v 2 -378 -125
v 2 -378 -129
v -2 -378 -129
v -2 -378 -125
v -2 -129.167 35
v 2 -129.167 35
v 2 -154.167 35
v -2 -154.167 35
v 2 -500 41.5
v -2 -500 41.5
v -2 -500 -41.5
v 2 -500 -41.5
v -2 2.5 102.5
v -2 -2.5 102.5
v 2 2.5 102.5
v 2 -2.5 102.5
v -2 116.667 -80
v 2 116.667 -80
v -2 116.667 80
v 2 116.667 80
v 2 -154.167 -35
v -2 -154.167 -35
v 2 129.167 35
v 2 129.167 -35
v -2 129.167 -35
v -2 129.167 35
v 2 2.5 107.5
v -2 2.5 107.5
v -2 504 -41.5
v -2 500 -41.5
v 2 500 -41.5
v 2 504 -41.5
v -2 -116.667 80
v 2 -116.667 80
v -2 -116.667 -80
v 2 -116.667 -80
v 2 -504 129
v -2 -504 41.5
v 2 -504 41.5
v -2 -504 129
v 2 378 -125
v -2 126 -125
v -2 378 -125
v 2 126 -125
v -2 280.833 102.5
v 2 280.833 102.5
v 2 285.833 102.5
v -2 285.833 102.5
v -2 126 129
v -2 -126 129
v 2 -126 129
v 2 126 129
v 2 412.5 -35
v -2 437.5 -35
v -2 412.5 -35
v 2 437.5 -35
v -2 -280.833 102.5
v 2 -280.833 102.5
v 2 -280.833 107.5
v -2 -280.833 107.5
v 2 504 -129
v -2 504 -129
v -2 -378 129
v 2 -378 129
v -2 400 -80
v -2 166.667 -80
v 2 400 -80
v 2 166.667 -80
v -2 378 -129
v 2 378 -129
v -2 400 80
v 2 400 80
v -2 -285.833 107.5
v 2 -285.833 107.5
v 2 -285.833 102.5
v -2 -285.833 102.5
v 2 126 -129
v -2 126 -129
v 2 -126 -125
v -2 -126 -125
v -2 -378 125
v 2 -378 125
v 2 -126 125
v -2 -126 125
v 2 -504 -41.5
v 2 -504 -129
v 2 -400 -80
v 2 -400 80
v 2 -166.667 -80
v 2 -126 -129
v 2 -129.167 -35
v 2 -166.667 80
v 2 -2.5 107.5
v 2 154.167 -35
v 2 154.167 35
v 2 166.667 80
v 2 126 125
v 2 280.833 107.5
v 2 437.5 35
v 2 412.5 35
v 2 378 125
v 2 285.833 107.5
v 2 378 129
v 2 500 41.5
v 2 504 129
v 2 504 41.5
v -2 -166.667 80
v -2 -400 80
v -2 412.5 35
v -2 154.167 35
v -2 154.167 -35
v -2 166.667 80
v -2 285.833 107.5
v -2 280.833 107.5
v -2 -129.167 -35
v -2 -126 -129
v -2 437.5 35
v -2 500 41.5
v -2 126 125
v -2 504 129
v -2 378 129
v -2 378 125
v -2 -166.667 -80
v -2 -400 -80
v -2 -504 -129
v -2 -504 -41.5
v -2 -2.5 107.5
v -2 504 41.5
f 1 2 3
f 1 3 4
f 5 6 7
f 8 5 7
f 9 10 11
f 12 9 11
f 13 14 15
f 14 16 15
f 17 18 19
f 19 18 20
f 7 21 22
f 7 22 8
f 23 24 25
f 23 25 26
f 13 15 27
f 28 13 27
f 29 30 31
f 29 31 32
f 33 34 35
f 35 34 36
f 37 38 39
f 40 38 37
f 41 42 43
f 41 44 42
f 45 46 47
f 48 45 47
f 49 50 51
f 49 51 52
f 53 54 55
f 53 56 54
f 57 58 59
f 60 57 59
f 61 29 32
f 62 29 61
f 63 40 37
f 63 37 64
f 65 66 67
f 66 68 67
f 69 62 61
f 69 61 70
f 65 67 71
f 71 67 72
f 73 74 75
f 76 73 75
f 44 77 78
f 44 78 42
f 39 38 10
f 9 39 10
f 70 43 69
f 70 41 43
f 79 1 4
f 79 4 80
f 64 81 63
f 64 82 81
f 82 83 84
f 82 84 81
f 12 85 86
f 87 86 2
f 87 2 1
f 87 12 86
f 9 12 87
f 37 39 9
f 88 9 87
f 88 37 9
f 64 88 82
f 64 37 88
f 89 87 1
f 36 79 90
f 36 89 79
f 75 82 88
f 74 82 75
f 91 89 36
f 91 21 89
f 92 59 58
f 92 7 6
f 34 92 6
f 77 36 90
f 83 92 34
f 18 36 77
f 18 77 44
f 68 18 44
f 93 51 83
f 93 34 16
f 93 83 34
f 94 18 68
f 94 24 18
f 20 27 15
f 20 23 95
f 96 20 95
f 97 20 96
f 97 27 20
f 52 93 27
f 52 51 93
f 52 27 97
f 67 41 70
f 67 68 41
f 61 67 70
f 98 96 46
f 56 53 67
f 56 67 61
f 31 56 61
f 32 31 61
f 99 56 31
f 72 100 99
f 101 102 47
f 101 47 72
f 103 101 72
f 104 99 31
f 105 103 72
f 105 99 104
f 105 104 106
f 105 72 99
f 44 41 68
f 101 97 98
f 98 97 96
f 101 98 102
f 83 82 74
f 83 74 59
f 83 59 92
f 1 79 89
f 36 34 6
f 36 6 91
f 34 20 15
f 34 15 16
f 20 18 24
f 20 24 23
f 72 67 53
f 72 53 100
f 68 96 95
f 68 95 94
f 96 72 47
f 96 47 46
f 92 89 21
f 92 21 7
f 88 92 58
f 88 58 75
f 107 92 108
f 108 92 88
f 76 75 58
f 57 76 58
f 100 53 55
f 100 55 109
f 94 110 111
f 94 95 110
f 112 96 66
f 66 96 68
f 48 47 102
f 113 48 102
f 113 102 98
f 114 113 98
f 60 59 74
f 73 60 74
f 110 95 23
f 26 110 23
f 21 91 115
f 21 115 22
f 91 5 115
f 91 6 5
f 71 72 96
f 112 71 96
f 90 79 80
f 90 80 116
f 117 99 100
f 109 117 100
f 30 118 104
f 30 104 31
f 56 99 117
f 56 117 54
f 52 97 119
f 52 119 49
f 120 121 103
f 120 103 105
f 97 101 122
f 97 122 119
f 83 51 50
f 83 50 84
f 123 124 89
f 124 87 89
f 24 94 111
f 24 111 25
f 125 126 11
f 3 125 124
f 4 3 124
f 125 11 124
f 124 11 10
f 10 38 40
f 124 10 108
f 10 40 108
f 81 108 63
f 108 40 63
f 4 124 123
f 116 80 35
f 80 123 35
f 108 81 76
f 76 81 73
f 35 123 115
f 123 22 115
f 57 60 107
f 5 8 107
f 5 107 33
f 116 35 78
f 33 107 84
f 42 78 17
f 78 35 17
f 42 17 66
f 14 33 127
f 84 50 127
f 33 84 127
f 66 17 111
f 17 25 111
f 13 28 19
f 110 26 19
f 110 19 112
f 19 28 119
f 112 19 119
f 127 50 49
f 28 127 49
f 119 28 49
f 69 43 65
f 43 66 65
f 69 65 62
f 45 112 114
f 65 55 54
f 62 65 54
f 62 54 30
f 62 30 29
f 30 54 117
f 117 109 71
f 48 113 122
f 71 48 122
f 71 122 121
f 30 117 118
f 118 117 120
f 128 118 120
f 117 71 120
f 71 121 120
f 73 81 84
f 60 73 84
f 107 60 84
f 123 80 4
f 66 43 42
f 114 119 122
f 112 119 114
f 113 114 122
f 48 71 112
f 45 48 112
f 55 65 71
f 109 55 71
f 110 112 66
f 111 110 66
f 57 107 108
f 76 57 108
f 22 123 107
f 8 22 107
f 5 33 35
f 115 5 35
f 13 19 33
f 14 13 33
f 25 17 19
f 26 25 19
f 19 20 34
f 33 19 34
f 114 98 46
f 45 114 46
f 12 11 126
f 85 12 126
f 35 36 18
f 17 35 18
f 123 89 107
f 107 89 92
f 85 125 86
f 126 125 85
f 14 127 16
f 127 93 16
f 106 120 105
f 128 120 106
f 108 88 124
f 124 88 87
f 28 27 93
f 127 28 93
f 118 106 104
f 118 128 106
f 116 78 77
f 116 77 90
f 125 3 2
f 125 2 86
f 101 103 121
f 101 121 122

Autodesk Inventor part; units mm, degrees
ref_plane "YZ Plane" through (0, 0, 0) normal (1, 0, 0) x (0, 1, 0)
ref_plane "XZ Plane" through (0, 0, 0) normal (0, 1, 0) x (-1, 0, 0)
ref_plane "XY Plane" through (0, 0, 0) normal (0, 0, 1) x (1, 0, 0)
sketch "Esboço1" plane through (0, 0, 0) normal (1, 0, 0) x (0, 1, 0)
  line L0 (-504, 129) -> (504, 129)
  line L1 (504, 129) -> (504, -129)
  line L2 (504, -129) -> (-504, -129)
  line L3 (-504, -129) -> (-504, 129)
  line L4 (-504, 129) -> (504, -129) construction
  line L5 (504, 129) -> (-504, -129) construction
  point P0 (0, 0)
  dimension "d0" = 1008
  dimension "d1" = 258
extrude "Extrusão1" add sketch "Esboço1" along normal mid plane 4
sketch "Esboço2" plane through (2, 0, 0) normal (1, 0, 0) x (0, 0, -1)
  line L0 (-133, 378) -> (-125, 378)
  line L1 (-125, 378) -> (-125, 126)
  line L2 (-125, 126) -> (-133, 126)
  line L3 (-133, 126) -> (-133, 378)
  line L4 (-129, 504) -> (-129, -504) projected
  line L5 (-133, 378) -> (-125, 126) construction
  line L6 (-125, 378) -> (-133, 126) construction
  line L7 (129, 504) -> (-129, 504) projected
  line L8 (-133, -126) -> (-125, -126)
  line L9 (-125, -126) -> (-125, -378)
  line L10 (-125, -378) -> (-133, -378)
  line L11 (-133, -378) -> (-133, -126)
  line L12 (-133, -126) -> (-125, -378) construction
  line L13 (-125, -126) -> (-133, -378) construction
  line L14 (-129, -504) -> (129, -504) projected
  line L15 (125, 378) -> (133, 378)
  line L16 (133, 378) -> (133, 126)
  line L17 (133, 126) -> (125, 126)
  line L18 (125, 126) -> (125, 378)
  line L19 (129, -504) -> (129, 504) projected
  line L20 (125, 378) -> (133, 126) construction
  line L21 (133, 378) -> (125, 126) construction
  line L22 (125, -126) -> (133, -126)
  line L23 (133, -126) -> (133, -378)
  line L24 (133, -378) -> (125, -378)
  line L25 (125, -378) -> (125, -126)
  line L26 (125, -126) -> (133, -378) construction
  line L27 (133, -126) -> (125, -378) construction
  point P0 (0, 0)
  point P1 (-129, 252)
  point P2 (-129, -252)
  point P3 (129, 252)
  point P4 (129, -252)
  dimension "d4" = 8
  dimension "d5" = 252
  dimension "d6" = 126
  dimension "d7" = 8
  dimension "d8" = 252
  dimension "d9" = 252
  dimension "d10" = 126
  dimension "d11" = 126
  dimension "d12" = 252
  dimension "d13" = 8
  dimension "d14" = 252
  dimension "d15" = 8
  dimension "d16" = 252
  dimension "d17" = 126
extrude "Extrusão2" cut sketch "Esboço2" along normal through all both and the other way through all contours L0 L4 L2 L3 | L0 L1 L2 L4 | L8 L9 L10 L4 | L4 L10 L11 L8 | L19 L17 L18 L15 | L15 L16 L17 L19 | L22 L23 L24 L19 | L19 L24 L25 L22
sketch "Esboço3" plane through (2, 0, 0) normal (1, 0, 0) x (0, 0, -1)
  line L0 (-41.5, 500) -> (41.5, 500)
  line L1 (41.5, 500) -> (41.5, 508)
  line L2 (41.5, 508) -> (-41.5, 508)
  line L3 (-41.5, 508) -> (-41.5, 500)
  line L4 (129, 504) -> (-129, 504) projected
  line L5 (-41.5, 500) -> (41.5, 508) construction
  line L6 (41.5, 500) -> (-41.5, 508) construction
  line L7 (-41.5, -500) -> (41.5, -500)
  line L8 (41.5, -500) -> (41.5, -508)
  line L9 (41.5, -508) -> (-41.5, -508)
  line L10 (-41.5, -508) -> (-41.5, -500)
  line L11 (-129, -504) -> (129, -504) projected
  line L12 (-41.5, -500) -> (41.5, -508) construction
  line L13 (41.5, -500) -> (-41.5, -508) construction
  point P0 (0, 0)
  point P1 (0, 504)
  point P2 (0, -504)
  dimension "d20" = 83
  dimension "d21" = 8
  dimension "d22" = 83
  dimension "d23" = 8
extrude "Extrusão3" cut sketch "Esboço3" along normal through all both and the other way through all
sketch "Esboço5" plane through (2, 0, 0) normal (1, 0, 0) x (0, 0, -1)
  line L0 (41.5, 500) -> (-41.5, 500) projected
  line L1 (0, 400) -> (-80, 400)
  line L2 (-125, 378) -> (-125, 126) projected
  line L3 (0, 400) -> (80, 400)
  line L4 (-80, 400) -> (-80, 166.6667)
  line L5 (-80, 166.6667) -> (80, 166.6667)
  line L6 (80, 166.6667) -> (80, 400)
  point P0 (0, 0)
  dimension "d39" = 80
  dimension "d40" = 80
  dimension "d41" = 233.3333
  dimension "d67" = 45
extrude "Extrusão5" cut sketch "Esboço5" against normal through all
pattern_linear "Padrão retangular2" count 3 spacing 283.3333 along (0, -1, 0) of "Extrusão5"
sketch "Esboço6" plane through (2, 0, 0) normal (1, 0, 0) x (0, 0, -1)
  line L0 (-80, -166.6667) -> (80, -166.6667) projected
  line L1 (80, -116.6667) -> (-80, -116.6667) projected
  line L2 (-80, -116.6667) -> (-30, -116.6667)
  line L3 (80, -116.6667) -> (30, -116.6667)
  line L4 (30, -116.6667) -> (-30, -116.6667)
  line L5 (-35, -129.1667) -> (35, -129.1667)
  line L6 (35, -129.1667) -> (35, -154.1667)
  line L7 (35, -154.1667) -> (-35, -154.1667)
  line L8 (-35, -129.1667) -> (-35, -154.1667)
  line L9 (-125, -126) -> (-125, -378) projected
  point P0 (0, 0)
  point P1 (-35, -141.6667)
  dimension "d51" = 25
  dimension "d68" = 90
  dimension "d69" = 12.5
  dimension "d70" = 70
extrude "Extrusão6" cut sketch "Esboço6" against normal through all
pattern_linear "Padrão retangular3" count 3 spacing 283.3333 along (0, 1, 0) of "Extrusão6"
sketch "Esboço7" plane through (2, 0, 0) normal (1, 0, 0) x (0, 0, -1)
  line L0 (-80, -400) -> (-80, -166.6667) projected
  line L1 (-125, -126) -> (-125, -378) projected
  line L2 (-80, 166.6667) -> (-80, 400) projected
  line L3 (-107.5, 280.8333) -> (-102.5, 280.8333)
  line L4 (-102.5, 280.8333) -> (-102.5, 285.8333)
  line L5 (-102.5, 285.8333) -> (-107.5, 285.8333)
  line L6 (-107.5, 285.8333) -> (-107.5, 280.8333)
  line L7 (-107.5, 280.8333) -> (-102.5, 285.8333) construction
  line L8 (-102.5, 280.8333) -> (-107.5, 285.8333) construction
  point P0 (0, 0)
  dimension "d60" = 5
  dimension "d61" = 5
extrude "Extrusão7" cut sketch "Esboço7" against normal through all
pattern_linear "Padrão retangular4" count 3 spacing 283.3333 along (0, -1, 0) of "Extrusão7"
properties part number "PAREDE FRONTAL"
